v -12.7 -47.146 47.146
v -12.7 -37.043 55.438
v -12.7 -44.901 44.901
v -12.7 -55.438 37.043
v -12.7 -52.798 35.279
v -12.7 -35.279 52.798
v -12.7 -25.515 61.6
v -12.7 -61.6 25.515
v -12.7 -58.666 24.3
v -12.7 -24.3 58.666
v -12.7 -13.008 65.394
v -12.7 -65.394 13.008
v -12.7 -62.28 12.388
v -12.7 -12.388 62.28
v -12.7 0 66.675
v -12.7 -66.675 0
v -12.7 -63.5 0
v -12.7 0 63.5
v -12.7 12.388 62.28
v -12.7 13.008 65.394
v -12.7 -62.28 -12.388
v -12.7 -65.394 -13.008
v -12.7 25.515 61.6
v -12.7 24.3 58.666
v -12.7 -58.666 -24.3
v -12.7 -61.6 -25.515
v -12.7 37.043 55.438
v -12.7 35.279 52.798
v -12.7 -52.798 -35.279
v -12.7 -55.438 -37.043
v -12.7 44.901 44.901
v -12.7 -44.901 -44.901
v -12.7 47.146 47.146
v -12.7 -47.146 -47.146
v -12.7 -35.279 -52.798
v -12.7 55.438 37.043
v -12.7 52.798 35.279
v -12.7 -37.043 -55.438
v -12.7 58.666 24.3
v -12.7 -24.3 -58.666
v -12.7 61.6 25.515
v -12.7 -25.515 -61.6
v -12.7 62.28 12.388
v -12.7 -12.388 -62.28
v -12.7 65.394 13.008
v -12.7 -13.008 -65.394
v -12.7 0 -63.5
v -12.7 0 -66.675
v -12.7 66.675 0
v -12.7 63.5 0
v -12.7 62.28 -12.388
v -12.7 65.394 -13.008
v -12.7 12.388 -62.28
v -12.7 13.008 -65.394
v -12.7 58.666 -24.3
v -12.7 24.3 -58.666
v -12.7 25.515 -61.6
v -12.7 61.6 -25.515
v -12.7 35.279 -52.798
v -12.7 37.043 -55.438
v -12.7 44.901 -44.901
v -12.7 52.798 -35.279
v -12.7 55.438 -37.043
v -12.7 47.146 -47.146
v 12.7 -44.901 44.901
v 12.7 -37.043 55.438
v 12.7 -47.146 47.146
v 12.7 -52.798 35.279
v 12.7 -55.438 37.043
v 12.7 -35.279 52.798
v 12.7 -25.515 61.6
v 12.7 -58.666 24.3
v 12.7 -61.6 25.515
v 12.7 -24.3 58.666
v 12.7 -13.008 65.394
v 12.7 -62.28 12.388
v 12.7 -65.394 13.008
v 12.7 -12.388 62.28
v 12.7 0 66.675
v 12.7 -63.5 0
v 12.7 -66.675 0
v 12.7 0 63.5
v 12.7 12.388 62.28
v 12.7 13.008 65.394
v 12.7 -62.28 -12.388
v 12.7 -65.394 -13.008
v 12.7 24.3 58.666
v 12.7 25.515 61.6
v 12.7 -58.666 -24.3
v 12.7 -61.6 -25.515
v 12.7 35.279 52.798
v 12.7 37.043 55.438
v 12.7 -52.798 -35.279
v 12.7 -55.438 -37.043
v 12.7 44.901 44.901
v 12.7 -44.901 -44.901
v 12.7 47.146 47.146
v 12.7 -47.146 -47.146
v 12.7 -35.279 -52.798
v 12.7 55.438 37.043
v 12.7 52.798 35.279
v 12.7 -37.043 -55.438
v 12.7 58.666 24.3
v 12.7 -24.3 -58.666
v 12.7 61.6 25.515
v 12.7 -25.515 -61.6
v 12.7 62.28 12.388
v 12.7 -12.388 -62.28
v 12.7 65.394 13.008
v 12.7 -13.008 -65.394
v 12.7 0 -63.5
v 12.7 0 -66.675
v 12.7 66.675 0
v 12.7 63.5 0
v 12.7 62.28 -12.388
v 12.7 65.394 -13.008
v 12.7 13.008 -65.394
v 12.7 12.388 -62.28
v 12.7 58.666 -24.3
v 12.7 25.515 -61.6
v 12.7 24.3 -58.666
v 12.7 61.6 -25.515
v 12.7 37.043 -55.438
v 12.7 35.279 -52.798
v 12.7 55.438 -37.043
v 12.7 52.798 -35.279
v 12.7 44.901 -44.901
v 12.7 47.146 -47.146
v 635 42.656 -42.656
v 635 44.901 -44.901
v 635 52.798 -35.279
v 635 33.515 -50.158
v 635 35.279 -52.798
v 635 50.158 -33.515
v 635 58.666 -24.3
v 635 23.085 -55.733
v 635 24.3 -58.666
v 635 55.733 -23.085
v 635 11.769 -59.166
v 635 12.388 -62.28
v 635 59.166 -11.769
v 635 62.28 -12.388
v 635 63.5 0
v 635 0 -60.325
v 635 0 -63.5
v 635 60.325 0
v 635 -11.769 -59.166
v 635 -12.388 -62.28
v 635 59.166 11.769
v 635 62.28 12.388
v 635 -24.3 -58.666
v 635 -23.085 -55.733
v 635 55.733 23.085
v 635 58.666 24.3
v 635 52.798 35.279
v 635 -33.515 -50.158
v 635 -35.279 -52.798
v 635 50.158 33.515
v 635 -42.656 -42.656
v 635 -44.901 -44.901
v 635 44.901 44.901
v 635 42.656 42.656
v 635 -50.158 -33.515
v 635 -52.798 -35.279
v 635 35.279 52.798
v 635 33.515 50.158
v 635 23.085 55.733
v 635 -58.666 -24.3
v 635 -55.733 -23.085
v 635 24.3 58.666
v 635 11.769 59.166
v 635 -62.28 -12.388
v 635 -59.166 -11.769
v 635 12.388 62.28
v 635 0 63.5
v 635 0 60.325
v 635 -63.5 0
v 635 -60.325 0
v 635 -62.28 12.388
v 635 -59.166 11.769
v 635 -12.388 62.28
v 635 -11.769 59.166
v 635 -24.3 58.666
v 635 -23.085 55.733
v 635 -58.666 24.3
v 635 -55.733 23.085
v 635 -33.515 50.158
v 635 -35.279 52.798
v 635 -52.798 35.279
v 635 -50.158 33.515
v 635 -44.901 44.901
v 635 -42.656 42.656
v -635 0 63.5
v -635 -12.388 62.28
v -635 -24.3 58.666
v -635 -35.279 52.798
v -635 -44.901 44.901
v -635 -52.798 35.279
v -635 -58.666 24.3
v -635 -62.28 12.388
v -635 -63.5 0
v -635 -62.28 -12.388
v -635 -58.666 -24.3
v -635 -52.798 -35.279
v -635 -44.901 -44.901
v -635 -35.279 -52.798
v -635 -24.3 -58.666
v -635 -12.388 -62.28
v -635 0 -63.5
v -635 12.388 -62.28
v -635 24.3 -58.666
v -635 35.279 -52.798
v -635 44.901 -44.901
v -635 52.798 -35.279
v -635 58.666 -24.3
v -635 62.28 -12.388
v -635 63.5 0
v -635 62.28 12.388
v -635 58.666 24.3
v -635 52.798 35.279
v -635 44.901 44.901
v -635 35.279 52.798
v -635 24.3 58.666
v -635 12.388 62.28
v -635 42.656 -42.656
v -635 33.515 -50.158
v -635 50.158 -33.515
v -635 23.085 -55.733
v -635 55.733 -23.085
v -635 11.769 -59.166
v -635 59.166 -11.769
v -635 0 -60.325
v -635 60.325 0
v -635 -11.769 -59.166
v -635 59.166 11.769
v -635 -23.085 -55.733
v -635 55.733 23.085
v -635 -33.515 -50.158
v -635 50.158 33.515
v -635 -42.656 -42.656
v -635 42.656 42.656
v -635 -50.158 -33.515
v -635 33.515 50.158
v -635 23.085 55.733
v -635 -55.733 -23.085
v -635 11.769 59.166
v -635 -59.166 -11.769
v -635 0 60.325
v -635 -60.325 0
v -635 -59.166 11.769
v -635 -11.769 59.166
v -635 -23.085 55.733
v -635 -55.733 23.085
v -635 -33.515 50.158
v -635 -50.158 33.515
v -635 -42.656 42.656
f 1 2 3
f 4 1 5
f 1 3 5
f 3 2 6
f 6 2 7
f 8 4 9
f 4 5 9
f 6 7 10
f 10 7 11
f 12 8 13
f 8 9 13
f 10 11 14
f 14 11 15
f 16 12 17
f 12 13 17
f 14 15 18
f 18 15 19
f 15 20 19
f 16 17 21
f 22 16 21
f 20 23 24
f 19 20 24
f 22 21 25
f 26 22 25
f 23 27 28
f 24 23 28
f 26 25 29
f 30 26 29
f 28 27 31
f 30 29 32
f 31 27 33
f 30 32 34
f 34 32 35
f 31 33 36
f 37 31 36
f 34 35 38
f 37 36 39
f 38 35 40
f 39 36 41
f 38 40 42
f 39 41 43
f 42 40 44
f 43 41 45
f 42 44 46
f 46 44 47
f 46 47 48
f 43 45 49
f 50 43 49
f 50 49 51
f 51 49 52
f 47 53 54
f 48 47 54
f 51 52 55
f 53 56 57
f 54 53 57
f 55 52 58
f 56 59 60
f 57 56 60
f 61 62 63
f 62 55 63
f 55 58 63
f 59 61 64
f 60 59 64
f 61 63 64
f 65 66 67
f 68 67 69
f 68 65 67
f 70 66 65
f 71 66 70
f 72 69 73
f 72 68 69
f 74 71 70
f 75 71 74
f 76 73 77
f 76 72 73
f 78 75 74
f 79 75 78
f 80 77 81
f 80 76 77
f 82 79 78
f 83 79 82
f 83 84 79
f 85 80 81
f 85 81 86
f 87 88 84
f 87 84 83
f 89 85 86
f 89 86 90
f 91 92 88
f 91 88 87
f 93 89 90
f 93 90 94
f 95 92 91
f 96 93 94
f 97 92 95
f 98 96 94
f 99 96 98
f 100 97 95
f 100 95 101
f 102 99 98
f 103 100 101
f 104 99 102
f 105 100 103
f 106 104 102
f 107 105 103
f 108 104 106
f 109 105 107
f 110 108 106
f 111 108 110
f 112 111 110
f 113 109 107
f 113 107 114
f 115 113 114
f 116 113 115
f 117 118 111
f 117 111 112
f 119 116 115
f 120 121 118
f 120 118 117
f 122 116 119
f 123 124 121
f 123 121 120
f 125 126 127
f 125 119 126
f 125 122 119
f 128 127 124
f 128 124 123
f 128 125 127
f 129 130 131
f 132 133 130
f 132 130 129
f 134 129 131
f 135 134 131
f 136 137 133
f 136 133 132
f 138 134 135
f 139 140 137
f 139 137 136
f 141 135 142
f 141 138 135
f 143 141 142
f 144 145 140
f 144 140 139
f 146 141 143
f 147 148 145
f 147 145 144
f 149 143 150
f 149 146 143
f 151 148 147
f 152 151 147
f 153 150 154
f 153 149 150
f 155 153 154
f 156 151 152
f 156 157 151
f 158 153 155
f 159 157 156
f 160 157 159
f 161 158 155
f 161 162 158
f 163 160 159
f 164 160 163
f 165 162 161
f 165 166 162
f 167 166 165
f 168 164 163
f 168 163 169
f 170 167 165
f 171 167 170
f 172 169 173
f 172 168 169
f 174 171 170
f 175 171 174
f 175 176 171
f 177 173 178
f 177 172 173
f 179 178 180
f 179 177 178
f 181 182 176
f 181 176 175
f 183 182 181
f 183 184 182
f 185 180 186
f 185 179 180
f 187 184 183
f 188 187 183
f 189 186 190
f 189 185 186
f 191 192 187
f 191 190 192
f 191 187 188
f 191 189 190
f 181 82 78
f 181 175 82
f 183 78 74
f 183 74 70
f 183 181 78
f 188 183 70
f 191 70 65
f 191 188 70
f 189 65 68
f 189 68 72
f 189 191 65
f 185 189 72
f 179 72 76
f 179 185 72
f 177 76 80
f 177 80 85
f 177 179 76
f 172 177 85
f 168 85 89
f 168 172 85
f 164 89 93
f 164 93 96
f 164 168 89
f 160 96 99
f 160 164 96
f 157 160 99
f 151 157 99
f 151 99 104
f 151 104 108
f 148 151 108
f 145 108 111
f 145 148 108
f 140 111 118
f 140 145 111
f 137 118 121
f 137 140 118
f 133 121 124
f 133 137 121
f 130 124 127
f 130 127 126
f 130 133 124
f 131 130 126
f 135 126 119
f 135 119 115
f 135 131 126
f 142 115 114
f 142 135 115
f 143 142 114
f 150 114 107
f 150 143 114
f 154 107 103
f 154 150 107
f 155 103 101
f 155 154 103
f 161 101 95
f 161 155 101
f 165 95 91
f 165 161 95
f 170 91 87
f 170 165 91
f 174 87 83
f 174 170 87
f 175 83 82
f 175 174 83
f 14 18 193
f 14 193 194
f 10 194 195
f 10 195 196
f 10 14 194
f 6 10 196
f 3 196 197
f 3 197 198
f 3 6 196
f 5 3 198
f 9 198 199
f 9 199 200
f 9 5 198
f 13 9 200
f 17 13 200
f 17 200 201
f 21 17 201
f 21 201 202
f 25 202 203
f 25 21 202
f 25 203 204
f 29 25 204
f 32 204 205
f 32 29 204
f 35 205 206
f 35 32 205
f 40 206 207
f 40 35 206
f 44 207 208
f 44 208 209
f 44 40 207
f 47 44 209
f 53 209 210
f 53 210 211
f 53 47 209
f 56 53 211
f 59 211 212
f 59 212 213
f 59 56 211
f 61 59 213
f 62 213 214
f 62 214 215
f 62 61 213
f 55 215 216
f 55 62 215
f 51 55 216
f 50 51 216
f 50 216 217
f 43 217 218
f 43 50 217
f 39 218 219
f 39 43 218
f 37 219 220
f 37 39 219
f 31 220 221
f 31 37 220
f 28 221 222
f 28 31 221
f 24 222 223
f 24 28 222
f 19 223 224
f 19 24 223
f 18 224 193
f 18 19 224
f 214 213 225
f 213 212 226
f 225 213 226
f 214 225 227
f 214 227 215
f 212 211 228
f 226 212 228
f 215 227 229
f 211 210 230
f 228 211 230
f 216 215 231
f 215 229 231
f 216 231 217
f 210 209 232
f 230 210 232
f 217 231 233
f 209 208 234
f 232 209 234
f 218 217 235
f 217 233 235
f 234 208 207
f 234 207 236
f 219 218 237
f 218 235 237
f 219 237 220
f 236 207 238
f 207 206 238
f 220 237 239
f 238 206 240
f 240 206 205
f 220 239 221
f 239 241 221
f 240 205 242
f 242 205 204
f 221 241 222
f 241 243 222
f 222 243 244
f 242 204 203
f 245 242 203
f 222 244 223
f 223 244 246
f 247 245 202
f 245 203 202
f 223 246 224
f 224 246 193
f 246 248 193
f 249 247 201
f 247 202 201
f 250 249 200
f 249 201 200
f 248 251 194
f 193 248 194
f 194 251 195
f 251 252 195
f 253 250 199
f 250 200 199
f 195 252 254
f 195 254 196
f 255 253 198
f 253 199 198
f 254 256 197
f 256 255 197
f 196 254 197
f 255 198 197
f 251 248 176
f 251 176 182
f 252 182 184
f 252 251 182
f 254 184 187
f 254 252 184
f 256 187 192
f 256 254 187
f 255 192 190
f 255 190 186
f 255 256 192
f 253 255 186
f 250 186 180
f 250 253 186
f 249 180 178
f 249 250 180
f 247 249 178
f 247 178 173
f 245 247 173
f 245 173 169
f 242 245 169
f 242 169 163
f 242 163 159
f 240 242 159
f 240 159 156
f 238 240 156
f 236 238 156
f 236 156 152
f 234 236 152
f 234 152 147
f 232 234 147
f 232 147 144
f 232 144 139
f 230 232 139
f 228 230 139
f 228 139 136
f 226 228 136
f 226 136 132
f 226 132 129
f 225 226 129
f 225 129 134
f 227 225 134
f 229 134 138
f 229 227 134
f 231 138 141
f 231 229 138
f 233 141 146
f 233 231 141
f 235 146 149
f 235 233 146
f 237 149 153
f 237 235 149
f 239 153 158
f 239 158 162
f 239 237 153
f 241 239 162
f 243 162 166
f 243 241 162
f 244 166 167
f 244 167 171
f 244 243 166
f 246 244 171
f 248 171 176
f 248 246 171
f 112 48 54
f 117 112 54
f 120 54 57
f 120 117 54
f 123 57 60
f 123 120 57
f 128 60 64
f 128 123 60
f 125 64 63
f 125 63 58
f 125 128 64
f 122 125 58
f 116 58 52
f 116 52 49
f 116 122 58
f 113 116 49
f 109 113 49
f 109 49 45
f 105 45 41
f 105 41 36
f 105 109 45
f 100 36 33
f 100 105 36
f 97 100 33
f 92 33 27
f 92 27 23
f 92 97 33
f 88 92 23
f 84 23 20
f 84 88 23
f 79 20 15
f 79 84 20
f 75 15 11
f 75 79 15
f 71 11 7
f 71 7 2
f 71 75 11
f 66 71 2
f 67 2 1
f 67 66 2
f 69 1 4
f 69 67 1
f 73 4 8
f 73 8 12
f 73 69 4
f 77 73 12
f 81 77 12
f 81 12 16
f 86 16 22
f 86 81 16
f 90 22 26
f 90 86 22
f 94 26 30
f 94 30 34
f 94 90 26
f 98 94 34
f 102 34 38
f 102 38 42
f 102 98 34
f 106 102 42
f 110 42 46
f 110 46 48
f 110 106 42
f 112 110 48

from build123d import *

# Parameters (mm, degrees)
SKETCH1_R           = 63.5
SKETCH1_R_2         = 60.325
BOSS_EXTRUDE1_DEPTH = 635
SKETCH3_R           = 66.675
BOSS_EXTRUDE3_DEPTH = 12.7
SKETCH13_R          = 60.325
CUT_EXTRUDE2_DEPTH  = 72.39


with BuildPart() as part:
    # Sketch1 → Boss-Extrude1 (new, symmetric)
    with BuildSketch(Plane(origin=(0, 0, 0), x_dir=(0, 0, -1), z_dir=(1, 0, 0))):
        with Locations(Location((0, 0, 0), (0, 0, 180))):
            Circle(SKETCH1_R)
        with Locations(Location((0, 0, 0), (0, 0, 180))):
            Circle(SKETCH1_R_2, mode=Mode.SUBTRACT)
    extrude(amount=BOSS_EXTRUDE1_DEPTH, both=True)

    # Sketch3 → Boss-Extrude3 (add, symmetric)
    with BuildSketch(Plane(origin=(0, 0, 0), x_dir=(0, 0, -1), z_dir=(1, 0, 0))):
        Circle(SKETCH3_R)
    extrude(amount=BOSS_EXTRUDE3_DEPTH, both=True)

    # Sketch13 → Cut-Extrude2 (cut, symmetric)
    with BuildSketch(Plane.ZY.offset(12.7)):
        Circle(SKETCH13_R)
    extrude(amount=CUT_EXTRUDE2_DEPTH, both=True, mode=Mode.SUBTRACT)


solid = part.part
